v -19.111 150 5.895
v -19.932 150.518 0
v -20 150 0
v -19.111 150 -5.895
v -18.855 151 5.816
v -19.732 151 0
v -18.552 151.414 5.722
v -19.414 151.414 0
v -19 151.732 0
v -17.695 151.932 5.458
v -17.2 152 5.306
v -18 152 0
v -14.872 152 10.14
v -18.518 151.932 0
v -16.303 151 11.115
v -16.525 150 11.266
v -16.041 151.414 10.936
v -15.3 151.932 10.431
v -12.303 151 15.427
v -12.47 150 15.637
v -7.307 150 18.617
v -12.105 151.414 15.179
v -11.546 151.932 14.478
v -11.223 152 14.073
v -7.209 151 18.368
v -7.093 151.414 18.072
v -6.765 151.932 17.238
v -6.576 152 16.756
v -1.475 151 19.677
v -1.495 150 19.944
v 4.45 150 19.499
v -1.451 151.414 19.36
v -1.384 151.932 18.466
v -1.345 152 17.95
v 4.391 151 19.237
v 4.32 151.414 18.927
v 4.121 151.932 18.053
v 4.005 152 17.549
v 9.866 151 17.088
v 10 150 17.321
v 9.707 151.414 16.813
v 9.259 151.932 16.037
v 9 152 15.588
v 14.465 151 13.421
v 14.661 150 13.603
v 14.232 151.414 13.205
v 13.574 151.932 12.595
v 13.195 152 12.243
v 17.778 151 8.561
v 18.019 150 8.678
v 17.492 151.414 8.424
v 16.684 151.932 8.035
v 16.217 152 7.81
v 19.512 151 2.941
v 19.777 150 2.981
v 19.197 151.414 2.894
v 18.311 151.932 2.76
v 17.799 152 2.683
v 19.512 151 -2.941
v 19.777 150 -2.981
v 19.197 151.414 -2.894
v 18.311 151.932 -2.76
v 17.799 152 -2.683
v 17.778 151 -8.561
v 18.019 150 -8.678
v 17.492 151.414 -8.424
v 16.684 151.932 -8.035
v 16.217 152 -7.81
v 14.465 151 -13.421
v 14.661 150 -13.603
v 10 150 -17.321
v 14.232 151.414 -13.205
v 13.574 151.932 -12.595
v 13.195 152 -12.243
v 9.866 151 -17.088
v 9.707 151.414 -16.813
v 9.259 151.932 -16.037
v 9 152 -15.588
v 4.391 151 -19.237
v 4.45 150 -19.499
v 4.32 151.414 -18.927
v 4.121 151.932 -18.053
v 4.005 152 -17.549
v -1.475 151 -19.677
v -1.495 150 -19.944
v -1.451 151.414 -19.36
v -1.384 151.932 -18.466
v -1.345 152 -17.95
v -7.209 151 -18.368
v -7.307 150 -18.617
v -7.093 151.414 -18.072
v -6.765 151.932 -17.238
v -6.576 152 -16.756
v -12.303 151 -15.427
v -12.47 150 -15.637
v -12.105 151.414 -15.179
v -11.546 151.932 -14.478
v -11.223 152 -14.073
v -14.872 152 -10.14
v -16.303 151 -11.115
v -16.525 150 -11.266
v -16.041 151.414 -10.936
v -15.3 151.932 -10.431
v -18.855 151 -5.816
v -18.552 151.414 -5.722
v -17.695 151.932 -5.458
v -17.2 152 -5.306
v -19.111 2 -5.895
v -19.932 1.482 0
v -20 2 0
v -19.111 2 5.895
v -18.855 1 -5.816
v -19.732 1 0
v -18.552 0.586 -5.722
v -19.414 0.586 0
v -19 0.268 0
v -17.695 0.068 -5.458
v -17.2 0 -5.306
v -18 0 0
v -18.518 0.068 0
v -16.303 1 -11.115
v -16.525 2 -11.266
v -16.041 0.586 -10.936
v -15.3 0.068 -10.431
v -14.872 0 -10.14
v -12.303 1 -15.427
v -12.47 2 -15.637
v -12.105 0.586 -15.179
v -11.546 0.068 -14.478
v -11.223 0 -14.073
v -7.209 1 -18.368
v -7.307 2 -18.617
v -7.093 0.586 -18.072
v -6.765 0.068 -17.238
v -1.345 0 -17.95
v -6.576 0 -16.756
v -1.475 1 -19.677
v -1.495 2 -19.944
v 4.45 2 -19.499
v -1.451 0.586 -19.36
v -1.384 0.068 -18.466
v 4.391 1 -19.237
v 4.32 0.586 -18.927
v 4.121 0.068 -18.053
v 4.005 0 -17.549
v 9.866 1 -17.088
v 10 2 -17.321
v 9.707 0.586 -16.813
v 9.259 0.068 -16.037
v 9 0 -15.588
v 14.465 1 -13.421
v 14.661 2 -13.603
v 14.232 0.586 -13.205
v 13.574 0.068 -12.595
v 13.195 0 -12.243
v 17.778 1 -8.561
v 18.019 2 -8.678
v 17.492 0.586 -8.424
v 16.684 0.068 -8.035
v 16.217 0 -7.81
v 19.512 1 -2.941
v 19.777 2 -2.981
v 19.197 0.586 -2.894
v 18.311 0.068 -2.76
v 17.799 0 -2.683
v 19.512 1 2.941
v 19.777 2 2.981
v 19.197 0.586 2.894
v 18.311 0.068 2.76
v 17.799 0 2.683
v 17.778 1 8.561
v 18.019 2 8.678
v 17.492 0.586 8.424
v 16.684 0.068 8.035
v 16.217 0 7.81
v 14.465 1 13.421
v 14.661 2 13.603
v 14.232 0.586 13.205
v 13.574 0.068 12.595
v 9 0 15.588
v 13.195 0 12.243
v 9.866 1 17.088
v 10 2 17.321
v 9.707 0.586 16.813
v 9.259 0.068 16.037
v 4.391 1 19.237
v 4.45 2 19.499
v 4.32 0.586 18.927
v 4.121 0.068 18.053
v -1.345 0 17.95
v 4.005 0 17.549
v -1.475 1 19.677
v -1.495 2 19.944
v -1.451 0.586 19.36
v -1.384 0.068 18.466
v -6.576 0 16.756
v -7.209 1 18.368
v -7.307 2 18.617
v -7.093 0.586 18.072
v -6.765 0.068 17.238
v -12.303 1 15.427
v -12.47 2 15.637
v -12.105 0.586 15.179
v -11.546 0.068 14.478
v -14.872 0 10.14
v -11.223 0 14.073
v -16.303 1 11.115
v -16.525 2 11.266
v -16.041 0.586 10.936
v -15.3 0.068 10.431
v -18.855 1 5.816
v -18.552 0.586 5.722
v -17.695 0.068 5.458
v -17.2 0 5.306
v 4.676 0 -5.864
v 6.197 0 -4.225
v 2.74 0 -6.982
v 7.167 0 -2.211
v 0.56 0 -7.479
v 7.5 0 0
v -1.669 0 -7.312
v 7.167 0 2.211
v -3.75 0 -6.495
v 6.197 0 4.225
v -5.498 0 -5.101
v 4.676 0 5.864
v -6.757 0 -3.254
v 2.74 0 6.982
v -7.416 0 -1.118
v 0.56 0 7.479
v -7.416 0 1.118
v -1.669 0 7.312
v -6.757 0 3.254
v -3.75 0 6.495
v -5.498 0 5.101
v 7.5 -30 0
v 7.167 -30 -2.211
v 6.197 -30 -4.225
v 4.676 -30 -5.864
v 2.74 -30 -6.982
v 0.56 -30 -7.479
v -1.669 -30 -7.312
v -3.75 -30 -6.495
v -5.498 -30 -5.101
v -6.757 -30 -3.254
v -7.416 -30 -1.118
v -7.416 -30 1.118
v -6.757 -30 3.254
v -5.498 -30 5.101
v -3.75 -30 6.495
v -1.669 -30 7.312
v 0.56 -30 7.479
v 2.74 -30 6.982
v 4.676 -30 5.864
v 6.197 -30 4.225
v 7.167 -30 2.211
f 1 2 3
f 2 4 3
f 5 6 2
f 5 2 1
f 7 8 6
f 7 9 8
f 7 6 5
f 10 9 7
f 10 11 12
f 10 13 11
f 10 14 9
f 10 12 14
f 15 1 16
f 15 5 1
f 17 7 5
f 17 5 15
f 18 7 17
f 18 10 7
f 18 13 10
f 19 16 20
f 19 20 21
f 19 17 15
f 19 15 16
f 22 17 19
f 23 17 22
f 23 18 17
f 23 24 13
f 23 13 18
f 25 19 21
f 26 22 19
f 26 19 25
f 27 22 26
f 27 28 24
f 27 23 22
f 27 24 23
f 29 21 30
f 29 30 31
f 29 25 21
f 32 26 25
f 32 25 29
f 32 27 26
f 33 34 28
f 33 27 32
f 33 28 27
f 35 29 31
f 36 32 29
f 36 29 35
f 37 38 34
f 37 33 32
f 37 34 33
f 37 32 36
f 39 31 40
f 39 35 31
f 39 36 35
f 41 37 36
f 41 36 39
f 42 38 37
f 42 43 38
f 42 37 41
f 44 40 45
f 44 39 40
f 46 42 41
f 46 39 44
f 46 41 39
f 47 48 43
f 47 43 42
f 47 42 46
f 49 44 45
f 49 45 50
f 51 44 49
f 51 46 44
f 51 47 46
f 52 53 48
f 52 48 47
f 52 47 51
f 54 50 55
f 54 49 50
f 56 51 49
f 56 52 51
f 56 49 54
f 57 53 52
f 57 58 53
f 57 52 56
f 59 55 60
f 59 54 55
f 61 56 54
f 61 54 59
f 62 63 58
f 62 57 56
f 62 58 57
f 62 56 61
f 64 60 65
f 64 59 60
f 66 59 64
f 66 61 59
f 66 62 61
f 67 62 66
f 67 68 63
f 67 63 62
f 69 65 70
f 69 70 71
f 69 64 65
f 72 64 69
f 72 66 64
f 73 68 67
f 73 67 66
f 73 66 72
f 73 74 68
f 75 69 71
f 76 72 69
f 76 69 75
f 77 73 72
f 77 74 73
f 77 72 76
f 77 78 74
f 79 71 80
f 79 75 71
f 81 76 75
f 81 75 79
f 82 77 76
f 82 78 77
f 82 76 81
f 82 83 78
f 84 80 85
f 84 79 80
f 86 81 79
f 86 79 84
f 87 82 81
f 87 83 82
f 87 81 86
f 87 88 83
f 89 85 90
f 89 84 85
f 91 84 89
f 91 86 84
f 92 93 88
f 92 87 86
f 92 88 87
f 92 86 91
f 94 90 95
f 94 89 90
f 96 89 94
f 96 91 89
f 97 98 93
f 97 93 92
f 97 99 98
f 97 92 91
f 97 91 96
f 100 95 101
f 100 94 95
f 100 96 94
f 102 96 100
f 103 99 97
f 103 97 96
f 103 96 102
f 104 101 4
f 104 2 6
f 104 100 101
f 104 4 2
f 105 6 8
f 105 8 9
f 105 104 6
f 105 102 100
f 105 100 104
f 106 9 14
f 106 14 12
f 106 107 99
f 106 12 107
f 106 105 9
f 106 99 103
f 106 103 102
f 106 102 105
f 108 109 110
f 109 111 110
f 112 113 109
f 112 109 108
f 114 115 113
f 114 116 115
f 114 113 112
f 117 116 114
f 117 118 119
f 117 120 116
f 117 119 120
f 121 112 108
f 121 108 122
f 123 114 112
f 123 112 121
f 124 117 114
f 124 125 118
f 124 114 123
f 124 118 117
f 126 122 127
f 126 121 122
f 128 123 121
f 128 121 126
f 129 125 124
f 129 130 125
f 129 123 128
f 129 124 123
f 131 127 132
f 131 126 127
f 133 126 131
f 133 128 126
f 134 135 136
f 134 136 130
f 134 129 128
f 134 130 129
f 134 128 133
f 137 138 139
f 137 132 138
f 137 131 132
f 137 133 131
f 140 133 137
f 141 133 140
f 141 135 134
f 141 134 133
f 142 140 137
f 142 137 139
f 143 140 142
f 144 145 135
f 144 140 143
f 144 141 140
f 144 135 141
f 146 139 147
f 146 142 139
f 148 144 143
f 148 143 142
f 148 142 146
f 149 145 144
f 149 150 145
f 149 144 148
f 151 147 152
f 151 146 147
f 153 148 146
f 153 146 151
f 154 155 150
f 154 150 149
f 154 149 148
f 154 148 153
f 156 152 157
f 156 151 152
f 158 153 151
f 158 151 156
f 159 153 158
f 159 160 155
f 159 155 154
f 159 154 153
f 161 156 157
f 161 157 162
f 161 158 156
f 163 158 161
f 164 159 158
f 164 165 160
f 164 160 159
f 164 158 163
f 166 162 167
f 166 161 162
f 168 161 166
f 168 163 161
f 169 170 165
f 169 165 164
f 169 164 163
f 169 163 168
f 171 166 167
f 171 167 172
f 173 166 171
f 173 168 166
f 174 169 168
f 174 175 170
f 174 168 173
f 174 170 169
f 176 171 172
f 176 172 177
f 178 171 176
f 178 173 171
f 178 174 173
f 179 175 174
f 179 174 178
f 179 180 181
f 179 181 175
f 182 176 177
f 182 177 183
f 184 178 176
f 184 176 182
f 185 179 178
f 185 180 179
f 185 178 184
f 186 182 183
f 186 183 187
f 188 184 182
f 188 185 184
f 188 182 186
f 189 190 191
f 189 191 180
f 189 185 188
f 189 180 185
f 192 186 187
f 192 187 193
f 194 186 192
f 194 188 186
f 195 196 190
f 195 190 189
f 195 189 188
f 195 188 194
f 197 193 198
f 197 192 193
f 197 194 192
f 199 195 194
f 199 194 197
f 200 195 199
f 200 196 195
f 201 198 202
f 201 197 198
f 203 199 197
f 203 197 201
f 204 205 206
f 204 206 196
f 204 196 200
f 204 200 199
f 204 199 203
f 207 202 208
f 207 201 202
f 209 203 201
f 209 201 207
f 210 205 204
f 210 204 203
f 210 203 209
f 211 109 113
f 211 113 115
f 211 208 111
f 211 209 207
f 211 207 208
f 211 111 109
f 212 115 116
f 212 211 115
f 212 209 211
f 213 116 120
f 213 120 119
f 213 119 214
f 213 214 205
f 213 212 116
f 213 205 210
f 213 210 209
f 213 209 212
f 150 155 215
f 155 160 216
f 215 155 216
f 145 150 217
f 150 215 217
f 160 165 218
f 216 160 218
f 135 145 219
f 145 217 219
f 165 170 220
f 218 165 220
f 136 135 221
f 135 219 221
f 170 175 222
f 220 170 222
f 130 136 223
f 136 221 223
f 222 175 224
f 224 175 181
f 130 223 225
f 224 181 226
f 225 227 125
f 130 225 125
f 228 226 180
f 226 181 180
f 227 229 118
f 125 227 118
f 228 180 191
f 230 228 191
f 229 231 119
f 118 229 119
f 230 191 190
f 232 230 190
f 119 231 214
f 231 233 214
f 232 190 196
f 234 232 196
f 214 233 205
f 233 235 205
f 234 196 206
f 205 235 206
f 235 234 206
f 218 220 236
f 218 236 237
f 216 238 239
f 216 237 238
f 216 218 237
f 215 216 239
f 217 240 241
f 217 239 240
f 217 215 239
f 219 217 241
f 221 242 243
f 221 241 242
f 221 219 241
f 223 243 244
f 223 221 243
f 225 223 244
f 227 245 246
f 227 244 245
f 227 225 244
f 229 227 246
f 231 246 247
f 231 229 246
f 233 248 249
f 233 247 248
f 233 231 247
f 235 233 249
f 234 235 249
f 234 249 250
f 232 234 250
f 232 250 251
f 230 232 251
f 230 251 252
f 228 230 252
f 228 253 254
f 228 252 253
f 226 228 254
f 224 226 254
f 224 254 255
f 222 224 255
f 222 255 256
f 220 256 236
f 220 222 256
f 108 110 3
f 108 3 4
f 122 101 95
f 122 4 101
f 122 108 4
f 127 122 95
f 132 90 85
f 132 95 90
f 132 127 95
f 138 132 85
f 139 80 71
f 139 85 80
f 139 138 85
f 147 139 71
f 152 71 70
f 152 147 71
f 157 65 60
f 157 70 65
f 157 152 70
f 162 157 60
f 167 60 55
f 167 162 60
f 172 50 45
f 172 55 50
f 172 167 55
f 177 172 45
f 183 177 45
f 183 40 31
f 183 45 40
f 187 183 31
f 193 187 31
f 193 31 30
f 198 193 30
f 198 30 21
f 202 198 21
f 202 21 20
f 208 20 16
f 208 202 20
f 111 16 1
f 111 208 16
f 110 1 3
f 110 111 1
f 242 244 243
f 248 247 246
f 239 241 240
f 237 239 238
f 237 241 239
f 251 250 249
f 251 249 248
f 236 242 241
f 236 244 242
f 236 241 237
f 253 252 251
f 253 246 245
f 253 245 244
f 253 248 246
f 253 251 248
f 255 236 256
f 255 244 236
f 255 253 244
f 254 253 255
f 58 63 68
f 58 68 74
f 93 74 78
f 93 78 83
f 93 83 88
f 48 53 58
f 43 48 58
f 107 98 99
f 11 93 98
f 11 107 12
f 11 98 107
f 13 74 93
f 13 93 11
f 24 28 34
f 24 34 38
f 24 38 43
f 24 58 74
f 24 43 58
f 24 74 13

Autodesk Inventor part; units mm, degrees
ref_plane "YZ Plane" through (0, 0, 0) normal (1, 0, 0) x (0, 1, 0)
ref_plane "XZ Plane" through (0, 0, 0) normal (0, 1, 0) x (-1, 0, 0)
ref_plane "XY Plane" through (0, 0, 0) normal (0, 0, 1) x (1, 0, 0)
sketch "Sketch1" plane through (0, 0, 0) normal (0, 1, 0) x (-1, 0, 0)
  circle A0 centre (0, 0) radius 20
  dimension "d0" = 40
extrude "Extrusion1" add sketch "Sketch1" along normal blind 152
fillet "Fillet1" radius 2 2 edges at (20, 152, 0) (20, 0, 0)
sketch "Sketch2" plane through (0, 0, 0) normal (0, -1, 0) x (1, 0, 0)
  circle A0 centre (0, 0) radius 7.5
  dimension "d4" = 15
extrude "Extrusion2" add sketch "Sketch2" along normal blind 30
properties part number "40152S" material "Lead"
